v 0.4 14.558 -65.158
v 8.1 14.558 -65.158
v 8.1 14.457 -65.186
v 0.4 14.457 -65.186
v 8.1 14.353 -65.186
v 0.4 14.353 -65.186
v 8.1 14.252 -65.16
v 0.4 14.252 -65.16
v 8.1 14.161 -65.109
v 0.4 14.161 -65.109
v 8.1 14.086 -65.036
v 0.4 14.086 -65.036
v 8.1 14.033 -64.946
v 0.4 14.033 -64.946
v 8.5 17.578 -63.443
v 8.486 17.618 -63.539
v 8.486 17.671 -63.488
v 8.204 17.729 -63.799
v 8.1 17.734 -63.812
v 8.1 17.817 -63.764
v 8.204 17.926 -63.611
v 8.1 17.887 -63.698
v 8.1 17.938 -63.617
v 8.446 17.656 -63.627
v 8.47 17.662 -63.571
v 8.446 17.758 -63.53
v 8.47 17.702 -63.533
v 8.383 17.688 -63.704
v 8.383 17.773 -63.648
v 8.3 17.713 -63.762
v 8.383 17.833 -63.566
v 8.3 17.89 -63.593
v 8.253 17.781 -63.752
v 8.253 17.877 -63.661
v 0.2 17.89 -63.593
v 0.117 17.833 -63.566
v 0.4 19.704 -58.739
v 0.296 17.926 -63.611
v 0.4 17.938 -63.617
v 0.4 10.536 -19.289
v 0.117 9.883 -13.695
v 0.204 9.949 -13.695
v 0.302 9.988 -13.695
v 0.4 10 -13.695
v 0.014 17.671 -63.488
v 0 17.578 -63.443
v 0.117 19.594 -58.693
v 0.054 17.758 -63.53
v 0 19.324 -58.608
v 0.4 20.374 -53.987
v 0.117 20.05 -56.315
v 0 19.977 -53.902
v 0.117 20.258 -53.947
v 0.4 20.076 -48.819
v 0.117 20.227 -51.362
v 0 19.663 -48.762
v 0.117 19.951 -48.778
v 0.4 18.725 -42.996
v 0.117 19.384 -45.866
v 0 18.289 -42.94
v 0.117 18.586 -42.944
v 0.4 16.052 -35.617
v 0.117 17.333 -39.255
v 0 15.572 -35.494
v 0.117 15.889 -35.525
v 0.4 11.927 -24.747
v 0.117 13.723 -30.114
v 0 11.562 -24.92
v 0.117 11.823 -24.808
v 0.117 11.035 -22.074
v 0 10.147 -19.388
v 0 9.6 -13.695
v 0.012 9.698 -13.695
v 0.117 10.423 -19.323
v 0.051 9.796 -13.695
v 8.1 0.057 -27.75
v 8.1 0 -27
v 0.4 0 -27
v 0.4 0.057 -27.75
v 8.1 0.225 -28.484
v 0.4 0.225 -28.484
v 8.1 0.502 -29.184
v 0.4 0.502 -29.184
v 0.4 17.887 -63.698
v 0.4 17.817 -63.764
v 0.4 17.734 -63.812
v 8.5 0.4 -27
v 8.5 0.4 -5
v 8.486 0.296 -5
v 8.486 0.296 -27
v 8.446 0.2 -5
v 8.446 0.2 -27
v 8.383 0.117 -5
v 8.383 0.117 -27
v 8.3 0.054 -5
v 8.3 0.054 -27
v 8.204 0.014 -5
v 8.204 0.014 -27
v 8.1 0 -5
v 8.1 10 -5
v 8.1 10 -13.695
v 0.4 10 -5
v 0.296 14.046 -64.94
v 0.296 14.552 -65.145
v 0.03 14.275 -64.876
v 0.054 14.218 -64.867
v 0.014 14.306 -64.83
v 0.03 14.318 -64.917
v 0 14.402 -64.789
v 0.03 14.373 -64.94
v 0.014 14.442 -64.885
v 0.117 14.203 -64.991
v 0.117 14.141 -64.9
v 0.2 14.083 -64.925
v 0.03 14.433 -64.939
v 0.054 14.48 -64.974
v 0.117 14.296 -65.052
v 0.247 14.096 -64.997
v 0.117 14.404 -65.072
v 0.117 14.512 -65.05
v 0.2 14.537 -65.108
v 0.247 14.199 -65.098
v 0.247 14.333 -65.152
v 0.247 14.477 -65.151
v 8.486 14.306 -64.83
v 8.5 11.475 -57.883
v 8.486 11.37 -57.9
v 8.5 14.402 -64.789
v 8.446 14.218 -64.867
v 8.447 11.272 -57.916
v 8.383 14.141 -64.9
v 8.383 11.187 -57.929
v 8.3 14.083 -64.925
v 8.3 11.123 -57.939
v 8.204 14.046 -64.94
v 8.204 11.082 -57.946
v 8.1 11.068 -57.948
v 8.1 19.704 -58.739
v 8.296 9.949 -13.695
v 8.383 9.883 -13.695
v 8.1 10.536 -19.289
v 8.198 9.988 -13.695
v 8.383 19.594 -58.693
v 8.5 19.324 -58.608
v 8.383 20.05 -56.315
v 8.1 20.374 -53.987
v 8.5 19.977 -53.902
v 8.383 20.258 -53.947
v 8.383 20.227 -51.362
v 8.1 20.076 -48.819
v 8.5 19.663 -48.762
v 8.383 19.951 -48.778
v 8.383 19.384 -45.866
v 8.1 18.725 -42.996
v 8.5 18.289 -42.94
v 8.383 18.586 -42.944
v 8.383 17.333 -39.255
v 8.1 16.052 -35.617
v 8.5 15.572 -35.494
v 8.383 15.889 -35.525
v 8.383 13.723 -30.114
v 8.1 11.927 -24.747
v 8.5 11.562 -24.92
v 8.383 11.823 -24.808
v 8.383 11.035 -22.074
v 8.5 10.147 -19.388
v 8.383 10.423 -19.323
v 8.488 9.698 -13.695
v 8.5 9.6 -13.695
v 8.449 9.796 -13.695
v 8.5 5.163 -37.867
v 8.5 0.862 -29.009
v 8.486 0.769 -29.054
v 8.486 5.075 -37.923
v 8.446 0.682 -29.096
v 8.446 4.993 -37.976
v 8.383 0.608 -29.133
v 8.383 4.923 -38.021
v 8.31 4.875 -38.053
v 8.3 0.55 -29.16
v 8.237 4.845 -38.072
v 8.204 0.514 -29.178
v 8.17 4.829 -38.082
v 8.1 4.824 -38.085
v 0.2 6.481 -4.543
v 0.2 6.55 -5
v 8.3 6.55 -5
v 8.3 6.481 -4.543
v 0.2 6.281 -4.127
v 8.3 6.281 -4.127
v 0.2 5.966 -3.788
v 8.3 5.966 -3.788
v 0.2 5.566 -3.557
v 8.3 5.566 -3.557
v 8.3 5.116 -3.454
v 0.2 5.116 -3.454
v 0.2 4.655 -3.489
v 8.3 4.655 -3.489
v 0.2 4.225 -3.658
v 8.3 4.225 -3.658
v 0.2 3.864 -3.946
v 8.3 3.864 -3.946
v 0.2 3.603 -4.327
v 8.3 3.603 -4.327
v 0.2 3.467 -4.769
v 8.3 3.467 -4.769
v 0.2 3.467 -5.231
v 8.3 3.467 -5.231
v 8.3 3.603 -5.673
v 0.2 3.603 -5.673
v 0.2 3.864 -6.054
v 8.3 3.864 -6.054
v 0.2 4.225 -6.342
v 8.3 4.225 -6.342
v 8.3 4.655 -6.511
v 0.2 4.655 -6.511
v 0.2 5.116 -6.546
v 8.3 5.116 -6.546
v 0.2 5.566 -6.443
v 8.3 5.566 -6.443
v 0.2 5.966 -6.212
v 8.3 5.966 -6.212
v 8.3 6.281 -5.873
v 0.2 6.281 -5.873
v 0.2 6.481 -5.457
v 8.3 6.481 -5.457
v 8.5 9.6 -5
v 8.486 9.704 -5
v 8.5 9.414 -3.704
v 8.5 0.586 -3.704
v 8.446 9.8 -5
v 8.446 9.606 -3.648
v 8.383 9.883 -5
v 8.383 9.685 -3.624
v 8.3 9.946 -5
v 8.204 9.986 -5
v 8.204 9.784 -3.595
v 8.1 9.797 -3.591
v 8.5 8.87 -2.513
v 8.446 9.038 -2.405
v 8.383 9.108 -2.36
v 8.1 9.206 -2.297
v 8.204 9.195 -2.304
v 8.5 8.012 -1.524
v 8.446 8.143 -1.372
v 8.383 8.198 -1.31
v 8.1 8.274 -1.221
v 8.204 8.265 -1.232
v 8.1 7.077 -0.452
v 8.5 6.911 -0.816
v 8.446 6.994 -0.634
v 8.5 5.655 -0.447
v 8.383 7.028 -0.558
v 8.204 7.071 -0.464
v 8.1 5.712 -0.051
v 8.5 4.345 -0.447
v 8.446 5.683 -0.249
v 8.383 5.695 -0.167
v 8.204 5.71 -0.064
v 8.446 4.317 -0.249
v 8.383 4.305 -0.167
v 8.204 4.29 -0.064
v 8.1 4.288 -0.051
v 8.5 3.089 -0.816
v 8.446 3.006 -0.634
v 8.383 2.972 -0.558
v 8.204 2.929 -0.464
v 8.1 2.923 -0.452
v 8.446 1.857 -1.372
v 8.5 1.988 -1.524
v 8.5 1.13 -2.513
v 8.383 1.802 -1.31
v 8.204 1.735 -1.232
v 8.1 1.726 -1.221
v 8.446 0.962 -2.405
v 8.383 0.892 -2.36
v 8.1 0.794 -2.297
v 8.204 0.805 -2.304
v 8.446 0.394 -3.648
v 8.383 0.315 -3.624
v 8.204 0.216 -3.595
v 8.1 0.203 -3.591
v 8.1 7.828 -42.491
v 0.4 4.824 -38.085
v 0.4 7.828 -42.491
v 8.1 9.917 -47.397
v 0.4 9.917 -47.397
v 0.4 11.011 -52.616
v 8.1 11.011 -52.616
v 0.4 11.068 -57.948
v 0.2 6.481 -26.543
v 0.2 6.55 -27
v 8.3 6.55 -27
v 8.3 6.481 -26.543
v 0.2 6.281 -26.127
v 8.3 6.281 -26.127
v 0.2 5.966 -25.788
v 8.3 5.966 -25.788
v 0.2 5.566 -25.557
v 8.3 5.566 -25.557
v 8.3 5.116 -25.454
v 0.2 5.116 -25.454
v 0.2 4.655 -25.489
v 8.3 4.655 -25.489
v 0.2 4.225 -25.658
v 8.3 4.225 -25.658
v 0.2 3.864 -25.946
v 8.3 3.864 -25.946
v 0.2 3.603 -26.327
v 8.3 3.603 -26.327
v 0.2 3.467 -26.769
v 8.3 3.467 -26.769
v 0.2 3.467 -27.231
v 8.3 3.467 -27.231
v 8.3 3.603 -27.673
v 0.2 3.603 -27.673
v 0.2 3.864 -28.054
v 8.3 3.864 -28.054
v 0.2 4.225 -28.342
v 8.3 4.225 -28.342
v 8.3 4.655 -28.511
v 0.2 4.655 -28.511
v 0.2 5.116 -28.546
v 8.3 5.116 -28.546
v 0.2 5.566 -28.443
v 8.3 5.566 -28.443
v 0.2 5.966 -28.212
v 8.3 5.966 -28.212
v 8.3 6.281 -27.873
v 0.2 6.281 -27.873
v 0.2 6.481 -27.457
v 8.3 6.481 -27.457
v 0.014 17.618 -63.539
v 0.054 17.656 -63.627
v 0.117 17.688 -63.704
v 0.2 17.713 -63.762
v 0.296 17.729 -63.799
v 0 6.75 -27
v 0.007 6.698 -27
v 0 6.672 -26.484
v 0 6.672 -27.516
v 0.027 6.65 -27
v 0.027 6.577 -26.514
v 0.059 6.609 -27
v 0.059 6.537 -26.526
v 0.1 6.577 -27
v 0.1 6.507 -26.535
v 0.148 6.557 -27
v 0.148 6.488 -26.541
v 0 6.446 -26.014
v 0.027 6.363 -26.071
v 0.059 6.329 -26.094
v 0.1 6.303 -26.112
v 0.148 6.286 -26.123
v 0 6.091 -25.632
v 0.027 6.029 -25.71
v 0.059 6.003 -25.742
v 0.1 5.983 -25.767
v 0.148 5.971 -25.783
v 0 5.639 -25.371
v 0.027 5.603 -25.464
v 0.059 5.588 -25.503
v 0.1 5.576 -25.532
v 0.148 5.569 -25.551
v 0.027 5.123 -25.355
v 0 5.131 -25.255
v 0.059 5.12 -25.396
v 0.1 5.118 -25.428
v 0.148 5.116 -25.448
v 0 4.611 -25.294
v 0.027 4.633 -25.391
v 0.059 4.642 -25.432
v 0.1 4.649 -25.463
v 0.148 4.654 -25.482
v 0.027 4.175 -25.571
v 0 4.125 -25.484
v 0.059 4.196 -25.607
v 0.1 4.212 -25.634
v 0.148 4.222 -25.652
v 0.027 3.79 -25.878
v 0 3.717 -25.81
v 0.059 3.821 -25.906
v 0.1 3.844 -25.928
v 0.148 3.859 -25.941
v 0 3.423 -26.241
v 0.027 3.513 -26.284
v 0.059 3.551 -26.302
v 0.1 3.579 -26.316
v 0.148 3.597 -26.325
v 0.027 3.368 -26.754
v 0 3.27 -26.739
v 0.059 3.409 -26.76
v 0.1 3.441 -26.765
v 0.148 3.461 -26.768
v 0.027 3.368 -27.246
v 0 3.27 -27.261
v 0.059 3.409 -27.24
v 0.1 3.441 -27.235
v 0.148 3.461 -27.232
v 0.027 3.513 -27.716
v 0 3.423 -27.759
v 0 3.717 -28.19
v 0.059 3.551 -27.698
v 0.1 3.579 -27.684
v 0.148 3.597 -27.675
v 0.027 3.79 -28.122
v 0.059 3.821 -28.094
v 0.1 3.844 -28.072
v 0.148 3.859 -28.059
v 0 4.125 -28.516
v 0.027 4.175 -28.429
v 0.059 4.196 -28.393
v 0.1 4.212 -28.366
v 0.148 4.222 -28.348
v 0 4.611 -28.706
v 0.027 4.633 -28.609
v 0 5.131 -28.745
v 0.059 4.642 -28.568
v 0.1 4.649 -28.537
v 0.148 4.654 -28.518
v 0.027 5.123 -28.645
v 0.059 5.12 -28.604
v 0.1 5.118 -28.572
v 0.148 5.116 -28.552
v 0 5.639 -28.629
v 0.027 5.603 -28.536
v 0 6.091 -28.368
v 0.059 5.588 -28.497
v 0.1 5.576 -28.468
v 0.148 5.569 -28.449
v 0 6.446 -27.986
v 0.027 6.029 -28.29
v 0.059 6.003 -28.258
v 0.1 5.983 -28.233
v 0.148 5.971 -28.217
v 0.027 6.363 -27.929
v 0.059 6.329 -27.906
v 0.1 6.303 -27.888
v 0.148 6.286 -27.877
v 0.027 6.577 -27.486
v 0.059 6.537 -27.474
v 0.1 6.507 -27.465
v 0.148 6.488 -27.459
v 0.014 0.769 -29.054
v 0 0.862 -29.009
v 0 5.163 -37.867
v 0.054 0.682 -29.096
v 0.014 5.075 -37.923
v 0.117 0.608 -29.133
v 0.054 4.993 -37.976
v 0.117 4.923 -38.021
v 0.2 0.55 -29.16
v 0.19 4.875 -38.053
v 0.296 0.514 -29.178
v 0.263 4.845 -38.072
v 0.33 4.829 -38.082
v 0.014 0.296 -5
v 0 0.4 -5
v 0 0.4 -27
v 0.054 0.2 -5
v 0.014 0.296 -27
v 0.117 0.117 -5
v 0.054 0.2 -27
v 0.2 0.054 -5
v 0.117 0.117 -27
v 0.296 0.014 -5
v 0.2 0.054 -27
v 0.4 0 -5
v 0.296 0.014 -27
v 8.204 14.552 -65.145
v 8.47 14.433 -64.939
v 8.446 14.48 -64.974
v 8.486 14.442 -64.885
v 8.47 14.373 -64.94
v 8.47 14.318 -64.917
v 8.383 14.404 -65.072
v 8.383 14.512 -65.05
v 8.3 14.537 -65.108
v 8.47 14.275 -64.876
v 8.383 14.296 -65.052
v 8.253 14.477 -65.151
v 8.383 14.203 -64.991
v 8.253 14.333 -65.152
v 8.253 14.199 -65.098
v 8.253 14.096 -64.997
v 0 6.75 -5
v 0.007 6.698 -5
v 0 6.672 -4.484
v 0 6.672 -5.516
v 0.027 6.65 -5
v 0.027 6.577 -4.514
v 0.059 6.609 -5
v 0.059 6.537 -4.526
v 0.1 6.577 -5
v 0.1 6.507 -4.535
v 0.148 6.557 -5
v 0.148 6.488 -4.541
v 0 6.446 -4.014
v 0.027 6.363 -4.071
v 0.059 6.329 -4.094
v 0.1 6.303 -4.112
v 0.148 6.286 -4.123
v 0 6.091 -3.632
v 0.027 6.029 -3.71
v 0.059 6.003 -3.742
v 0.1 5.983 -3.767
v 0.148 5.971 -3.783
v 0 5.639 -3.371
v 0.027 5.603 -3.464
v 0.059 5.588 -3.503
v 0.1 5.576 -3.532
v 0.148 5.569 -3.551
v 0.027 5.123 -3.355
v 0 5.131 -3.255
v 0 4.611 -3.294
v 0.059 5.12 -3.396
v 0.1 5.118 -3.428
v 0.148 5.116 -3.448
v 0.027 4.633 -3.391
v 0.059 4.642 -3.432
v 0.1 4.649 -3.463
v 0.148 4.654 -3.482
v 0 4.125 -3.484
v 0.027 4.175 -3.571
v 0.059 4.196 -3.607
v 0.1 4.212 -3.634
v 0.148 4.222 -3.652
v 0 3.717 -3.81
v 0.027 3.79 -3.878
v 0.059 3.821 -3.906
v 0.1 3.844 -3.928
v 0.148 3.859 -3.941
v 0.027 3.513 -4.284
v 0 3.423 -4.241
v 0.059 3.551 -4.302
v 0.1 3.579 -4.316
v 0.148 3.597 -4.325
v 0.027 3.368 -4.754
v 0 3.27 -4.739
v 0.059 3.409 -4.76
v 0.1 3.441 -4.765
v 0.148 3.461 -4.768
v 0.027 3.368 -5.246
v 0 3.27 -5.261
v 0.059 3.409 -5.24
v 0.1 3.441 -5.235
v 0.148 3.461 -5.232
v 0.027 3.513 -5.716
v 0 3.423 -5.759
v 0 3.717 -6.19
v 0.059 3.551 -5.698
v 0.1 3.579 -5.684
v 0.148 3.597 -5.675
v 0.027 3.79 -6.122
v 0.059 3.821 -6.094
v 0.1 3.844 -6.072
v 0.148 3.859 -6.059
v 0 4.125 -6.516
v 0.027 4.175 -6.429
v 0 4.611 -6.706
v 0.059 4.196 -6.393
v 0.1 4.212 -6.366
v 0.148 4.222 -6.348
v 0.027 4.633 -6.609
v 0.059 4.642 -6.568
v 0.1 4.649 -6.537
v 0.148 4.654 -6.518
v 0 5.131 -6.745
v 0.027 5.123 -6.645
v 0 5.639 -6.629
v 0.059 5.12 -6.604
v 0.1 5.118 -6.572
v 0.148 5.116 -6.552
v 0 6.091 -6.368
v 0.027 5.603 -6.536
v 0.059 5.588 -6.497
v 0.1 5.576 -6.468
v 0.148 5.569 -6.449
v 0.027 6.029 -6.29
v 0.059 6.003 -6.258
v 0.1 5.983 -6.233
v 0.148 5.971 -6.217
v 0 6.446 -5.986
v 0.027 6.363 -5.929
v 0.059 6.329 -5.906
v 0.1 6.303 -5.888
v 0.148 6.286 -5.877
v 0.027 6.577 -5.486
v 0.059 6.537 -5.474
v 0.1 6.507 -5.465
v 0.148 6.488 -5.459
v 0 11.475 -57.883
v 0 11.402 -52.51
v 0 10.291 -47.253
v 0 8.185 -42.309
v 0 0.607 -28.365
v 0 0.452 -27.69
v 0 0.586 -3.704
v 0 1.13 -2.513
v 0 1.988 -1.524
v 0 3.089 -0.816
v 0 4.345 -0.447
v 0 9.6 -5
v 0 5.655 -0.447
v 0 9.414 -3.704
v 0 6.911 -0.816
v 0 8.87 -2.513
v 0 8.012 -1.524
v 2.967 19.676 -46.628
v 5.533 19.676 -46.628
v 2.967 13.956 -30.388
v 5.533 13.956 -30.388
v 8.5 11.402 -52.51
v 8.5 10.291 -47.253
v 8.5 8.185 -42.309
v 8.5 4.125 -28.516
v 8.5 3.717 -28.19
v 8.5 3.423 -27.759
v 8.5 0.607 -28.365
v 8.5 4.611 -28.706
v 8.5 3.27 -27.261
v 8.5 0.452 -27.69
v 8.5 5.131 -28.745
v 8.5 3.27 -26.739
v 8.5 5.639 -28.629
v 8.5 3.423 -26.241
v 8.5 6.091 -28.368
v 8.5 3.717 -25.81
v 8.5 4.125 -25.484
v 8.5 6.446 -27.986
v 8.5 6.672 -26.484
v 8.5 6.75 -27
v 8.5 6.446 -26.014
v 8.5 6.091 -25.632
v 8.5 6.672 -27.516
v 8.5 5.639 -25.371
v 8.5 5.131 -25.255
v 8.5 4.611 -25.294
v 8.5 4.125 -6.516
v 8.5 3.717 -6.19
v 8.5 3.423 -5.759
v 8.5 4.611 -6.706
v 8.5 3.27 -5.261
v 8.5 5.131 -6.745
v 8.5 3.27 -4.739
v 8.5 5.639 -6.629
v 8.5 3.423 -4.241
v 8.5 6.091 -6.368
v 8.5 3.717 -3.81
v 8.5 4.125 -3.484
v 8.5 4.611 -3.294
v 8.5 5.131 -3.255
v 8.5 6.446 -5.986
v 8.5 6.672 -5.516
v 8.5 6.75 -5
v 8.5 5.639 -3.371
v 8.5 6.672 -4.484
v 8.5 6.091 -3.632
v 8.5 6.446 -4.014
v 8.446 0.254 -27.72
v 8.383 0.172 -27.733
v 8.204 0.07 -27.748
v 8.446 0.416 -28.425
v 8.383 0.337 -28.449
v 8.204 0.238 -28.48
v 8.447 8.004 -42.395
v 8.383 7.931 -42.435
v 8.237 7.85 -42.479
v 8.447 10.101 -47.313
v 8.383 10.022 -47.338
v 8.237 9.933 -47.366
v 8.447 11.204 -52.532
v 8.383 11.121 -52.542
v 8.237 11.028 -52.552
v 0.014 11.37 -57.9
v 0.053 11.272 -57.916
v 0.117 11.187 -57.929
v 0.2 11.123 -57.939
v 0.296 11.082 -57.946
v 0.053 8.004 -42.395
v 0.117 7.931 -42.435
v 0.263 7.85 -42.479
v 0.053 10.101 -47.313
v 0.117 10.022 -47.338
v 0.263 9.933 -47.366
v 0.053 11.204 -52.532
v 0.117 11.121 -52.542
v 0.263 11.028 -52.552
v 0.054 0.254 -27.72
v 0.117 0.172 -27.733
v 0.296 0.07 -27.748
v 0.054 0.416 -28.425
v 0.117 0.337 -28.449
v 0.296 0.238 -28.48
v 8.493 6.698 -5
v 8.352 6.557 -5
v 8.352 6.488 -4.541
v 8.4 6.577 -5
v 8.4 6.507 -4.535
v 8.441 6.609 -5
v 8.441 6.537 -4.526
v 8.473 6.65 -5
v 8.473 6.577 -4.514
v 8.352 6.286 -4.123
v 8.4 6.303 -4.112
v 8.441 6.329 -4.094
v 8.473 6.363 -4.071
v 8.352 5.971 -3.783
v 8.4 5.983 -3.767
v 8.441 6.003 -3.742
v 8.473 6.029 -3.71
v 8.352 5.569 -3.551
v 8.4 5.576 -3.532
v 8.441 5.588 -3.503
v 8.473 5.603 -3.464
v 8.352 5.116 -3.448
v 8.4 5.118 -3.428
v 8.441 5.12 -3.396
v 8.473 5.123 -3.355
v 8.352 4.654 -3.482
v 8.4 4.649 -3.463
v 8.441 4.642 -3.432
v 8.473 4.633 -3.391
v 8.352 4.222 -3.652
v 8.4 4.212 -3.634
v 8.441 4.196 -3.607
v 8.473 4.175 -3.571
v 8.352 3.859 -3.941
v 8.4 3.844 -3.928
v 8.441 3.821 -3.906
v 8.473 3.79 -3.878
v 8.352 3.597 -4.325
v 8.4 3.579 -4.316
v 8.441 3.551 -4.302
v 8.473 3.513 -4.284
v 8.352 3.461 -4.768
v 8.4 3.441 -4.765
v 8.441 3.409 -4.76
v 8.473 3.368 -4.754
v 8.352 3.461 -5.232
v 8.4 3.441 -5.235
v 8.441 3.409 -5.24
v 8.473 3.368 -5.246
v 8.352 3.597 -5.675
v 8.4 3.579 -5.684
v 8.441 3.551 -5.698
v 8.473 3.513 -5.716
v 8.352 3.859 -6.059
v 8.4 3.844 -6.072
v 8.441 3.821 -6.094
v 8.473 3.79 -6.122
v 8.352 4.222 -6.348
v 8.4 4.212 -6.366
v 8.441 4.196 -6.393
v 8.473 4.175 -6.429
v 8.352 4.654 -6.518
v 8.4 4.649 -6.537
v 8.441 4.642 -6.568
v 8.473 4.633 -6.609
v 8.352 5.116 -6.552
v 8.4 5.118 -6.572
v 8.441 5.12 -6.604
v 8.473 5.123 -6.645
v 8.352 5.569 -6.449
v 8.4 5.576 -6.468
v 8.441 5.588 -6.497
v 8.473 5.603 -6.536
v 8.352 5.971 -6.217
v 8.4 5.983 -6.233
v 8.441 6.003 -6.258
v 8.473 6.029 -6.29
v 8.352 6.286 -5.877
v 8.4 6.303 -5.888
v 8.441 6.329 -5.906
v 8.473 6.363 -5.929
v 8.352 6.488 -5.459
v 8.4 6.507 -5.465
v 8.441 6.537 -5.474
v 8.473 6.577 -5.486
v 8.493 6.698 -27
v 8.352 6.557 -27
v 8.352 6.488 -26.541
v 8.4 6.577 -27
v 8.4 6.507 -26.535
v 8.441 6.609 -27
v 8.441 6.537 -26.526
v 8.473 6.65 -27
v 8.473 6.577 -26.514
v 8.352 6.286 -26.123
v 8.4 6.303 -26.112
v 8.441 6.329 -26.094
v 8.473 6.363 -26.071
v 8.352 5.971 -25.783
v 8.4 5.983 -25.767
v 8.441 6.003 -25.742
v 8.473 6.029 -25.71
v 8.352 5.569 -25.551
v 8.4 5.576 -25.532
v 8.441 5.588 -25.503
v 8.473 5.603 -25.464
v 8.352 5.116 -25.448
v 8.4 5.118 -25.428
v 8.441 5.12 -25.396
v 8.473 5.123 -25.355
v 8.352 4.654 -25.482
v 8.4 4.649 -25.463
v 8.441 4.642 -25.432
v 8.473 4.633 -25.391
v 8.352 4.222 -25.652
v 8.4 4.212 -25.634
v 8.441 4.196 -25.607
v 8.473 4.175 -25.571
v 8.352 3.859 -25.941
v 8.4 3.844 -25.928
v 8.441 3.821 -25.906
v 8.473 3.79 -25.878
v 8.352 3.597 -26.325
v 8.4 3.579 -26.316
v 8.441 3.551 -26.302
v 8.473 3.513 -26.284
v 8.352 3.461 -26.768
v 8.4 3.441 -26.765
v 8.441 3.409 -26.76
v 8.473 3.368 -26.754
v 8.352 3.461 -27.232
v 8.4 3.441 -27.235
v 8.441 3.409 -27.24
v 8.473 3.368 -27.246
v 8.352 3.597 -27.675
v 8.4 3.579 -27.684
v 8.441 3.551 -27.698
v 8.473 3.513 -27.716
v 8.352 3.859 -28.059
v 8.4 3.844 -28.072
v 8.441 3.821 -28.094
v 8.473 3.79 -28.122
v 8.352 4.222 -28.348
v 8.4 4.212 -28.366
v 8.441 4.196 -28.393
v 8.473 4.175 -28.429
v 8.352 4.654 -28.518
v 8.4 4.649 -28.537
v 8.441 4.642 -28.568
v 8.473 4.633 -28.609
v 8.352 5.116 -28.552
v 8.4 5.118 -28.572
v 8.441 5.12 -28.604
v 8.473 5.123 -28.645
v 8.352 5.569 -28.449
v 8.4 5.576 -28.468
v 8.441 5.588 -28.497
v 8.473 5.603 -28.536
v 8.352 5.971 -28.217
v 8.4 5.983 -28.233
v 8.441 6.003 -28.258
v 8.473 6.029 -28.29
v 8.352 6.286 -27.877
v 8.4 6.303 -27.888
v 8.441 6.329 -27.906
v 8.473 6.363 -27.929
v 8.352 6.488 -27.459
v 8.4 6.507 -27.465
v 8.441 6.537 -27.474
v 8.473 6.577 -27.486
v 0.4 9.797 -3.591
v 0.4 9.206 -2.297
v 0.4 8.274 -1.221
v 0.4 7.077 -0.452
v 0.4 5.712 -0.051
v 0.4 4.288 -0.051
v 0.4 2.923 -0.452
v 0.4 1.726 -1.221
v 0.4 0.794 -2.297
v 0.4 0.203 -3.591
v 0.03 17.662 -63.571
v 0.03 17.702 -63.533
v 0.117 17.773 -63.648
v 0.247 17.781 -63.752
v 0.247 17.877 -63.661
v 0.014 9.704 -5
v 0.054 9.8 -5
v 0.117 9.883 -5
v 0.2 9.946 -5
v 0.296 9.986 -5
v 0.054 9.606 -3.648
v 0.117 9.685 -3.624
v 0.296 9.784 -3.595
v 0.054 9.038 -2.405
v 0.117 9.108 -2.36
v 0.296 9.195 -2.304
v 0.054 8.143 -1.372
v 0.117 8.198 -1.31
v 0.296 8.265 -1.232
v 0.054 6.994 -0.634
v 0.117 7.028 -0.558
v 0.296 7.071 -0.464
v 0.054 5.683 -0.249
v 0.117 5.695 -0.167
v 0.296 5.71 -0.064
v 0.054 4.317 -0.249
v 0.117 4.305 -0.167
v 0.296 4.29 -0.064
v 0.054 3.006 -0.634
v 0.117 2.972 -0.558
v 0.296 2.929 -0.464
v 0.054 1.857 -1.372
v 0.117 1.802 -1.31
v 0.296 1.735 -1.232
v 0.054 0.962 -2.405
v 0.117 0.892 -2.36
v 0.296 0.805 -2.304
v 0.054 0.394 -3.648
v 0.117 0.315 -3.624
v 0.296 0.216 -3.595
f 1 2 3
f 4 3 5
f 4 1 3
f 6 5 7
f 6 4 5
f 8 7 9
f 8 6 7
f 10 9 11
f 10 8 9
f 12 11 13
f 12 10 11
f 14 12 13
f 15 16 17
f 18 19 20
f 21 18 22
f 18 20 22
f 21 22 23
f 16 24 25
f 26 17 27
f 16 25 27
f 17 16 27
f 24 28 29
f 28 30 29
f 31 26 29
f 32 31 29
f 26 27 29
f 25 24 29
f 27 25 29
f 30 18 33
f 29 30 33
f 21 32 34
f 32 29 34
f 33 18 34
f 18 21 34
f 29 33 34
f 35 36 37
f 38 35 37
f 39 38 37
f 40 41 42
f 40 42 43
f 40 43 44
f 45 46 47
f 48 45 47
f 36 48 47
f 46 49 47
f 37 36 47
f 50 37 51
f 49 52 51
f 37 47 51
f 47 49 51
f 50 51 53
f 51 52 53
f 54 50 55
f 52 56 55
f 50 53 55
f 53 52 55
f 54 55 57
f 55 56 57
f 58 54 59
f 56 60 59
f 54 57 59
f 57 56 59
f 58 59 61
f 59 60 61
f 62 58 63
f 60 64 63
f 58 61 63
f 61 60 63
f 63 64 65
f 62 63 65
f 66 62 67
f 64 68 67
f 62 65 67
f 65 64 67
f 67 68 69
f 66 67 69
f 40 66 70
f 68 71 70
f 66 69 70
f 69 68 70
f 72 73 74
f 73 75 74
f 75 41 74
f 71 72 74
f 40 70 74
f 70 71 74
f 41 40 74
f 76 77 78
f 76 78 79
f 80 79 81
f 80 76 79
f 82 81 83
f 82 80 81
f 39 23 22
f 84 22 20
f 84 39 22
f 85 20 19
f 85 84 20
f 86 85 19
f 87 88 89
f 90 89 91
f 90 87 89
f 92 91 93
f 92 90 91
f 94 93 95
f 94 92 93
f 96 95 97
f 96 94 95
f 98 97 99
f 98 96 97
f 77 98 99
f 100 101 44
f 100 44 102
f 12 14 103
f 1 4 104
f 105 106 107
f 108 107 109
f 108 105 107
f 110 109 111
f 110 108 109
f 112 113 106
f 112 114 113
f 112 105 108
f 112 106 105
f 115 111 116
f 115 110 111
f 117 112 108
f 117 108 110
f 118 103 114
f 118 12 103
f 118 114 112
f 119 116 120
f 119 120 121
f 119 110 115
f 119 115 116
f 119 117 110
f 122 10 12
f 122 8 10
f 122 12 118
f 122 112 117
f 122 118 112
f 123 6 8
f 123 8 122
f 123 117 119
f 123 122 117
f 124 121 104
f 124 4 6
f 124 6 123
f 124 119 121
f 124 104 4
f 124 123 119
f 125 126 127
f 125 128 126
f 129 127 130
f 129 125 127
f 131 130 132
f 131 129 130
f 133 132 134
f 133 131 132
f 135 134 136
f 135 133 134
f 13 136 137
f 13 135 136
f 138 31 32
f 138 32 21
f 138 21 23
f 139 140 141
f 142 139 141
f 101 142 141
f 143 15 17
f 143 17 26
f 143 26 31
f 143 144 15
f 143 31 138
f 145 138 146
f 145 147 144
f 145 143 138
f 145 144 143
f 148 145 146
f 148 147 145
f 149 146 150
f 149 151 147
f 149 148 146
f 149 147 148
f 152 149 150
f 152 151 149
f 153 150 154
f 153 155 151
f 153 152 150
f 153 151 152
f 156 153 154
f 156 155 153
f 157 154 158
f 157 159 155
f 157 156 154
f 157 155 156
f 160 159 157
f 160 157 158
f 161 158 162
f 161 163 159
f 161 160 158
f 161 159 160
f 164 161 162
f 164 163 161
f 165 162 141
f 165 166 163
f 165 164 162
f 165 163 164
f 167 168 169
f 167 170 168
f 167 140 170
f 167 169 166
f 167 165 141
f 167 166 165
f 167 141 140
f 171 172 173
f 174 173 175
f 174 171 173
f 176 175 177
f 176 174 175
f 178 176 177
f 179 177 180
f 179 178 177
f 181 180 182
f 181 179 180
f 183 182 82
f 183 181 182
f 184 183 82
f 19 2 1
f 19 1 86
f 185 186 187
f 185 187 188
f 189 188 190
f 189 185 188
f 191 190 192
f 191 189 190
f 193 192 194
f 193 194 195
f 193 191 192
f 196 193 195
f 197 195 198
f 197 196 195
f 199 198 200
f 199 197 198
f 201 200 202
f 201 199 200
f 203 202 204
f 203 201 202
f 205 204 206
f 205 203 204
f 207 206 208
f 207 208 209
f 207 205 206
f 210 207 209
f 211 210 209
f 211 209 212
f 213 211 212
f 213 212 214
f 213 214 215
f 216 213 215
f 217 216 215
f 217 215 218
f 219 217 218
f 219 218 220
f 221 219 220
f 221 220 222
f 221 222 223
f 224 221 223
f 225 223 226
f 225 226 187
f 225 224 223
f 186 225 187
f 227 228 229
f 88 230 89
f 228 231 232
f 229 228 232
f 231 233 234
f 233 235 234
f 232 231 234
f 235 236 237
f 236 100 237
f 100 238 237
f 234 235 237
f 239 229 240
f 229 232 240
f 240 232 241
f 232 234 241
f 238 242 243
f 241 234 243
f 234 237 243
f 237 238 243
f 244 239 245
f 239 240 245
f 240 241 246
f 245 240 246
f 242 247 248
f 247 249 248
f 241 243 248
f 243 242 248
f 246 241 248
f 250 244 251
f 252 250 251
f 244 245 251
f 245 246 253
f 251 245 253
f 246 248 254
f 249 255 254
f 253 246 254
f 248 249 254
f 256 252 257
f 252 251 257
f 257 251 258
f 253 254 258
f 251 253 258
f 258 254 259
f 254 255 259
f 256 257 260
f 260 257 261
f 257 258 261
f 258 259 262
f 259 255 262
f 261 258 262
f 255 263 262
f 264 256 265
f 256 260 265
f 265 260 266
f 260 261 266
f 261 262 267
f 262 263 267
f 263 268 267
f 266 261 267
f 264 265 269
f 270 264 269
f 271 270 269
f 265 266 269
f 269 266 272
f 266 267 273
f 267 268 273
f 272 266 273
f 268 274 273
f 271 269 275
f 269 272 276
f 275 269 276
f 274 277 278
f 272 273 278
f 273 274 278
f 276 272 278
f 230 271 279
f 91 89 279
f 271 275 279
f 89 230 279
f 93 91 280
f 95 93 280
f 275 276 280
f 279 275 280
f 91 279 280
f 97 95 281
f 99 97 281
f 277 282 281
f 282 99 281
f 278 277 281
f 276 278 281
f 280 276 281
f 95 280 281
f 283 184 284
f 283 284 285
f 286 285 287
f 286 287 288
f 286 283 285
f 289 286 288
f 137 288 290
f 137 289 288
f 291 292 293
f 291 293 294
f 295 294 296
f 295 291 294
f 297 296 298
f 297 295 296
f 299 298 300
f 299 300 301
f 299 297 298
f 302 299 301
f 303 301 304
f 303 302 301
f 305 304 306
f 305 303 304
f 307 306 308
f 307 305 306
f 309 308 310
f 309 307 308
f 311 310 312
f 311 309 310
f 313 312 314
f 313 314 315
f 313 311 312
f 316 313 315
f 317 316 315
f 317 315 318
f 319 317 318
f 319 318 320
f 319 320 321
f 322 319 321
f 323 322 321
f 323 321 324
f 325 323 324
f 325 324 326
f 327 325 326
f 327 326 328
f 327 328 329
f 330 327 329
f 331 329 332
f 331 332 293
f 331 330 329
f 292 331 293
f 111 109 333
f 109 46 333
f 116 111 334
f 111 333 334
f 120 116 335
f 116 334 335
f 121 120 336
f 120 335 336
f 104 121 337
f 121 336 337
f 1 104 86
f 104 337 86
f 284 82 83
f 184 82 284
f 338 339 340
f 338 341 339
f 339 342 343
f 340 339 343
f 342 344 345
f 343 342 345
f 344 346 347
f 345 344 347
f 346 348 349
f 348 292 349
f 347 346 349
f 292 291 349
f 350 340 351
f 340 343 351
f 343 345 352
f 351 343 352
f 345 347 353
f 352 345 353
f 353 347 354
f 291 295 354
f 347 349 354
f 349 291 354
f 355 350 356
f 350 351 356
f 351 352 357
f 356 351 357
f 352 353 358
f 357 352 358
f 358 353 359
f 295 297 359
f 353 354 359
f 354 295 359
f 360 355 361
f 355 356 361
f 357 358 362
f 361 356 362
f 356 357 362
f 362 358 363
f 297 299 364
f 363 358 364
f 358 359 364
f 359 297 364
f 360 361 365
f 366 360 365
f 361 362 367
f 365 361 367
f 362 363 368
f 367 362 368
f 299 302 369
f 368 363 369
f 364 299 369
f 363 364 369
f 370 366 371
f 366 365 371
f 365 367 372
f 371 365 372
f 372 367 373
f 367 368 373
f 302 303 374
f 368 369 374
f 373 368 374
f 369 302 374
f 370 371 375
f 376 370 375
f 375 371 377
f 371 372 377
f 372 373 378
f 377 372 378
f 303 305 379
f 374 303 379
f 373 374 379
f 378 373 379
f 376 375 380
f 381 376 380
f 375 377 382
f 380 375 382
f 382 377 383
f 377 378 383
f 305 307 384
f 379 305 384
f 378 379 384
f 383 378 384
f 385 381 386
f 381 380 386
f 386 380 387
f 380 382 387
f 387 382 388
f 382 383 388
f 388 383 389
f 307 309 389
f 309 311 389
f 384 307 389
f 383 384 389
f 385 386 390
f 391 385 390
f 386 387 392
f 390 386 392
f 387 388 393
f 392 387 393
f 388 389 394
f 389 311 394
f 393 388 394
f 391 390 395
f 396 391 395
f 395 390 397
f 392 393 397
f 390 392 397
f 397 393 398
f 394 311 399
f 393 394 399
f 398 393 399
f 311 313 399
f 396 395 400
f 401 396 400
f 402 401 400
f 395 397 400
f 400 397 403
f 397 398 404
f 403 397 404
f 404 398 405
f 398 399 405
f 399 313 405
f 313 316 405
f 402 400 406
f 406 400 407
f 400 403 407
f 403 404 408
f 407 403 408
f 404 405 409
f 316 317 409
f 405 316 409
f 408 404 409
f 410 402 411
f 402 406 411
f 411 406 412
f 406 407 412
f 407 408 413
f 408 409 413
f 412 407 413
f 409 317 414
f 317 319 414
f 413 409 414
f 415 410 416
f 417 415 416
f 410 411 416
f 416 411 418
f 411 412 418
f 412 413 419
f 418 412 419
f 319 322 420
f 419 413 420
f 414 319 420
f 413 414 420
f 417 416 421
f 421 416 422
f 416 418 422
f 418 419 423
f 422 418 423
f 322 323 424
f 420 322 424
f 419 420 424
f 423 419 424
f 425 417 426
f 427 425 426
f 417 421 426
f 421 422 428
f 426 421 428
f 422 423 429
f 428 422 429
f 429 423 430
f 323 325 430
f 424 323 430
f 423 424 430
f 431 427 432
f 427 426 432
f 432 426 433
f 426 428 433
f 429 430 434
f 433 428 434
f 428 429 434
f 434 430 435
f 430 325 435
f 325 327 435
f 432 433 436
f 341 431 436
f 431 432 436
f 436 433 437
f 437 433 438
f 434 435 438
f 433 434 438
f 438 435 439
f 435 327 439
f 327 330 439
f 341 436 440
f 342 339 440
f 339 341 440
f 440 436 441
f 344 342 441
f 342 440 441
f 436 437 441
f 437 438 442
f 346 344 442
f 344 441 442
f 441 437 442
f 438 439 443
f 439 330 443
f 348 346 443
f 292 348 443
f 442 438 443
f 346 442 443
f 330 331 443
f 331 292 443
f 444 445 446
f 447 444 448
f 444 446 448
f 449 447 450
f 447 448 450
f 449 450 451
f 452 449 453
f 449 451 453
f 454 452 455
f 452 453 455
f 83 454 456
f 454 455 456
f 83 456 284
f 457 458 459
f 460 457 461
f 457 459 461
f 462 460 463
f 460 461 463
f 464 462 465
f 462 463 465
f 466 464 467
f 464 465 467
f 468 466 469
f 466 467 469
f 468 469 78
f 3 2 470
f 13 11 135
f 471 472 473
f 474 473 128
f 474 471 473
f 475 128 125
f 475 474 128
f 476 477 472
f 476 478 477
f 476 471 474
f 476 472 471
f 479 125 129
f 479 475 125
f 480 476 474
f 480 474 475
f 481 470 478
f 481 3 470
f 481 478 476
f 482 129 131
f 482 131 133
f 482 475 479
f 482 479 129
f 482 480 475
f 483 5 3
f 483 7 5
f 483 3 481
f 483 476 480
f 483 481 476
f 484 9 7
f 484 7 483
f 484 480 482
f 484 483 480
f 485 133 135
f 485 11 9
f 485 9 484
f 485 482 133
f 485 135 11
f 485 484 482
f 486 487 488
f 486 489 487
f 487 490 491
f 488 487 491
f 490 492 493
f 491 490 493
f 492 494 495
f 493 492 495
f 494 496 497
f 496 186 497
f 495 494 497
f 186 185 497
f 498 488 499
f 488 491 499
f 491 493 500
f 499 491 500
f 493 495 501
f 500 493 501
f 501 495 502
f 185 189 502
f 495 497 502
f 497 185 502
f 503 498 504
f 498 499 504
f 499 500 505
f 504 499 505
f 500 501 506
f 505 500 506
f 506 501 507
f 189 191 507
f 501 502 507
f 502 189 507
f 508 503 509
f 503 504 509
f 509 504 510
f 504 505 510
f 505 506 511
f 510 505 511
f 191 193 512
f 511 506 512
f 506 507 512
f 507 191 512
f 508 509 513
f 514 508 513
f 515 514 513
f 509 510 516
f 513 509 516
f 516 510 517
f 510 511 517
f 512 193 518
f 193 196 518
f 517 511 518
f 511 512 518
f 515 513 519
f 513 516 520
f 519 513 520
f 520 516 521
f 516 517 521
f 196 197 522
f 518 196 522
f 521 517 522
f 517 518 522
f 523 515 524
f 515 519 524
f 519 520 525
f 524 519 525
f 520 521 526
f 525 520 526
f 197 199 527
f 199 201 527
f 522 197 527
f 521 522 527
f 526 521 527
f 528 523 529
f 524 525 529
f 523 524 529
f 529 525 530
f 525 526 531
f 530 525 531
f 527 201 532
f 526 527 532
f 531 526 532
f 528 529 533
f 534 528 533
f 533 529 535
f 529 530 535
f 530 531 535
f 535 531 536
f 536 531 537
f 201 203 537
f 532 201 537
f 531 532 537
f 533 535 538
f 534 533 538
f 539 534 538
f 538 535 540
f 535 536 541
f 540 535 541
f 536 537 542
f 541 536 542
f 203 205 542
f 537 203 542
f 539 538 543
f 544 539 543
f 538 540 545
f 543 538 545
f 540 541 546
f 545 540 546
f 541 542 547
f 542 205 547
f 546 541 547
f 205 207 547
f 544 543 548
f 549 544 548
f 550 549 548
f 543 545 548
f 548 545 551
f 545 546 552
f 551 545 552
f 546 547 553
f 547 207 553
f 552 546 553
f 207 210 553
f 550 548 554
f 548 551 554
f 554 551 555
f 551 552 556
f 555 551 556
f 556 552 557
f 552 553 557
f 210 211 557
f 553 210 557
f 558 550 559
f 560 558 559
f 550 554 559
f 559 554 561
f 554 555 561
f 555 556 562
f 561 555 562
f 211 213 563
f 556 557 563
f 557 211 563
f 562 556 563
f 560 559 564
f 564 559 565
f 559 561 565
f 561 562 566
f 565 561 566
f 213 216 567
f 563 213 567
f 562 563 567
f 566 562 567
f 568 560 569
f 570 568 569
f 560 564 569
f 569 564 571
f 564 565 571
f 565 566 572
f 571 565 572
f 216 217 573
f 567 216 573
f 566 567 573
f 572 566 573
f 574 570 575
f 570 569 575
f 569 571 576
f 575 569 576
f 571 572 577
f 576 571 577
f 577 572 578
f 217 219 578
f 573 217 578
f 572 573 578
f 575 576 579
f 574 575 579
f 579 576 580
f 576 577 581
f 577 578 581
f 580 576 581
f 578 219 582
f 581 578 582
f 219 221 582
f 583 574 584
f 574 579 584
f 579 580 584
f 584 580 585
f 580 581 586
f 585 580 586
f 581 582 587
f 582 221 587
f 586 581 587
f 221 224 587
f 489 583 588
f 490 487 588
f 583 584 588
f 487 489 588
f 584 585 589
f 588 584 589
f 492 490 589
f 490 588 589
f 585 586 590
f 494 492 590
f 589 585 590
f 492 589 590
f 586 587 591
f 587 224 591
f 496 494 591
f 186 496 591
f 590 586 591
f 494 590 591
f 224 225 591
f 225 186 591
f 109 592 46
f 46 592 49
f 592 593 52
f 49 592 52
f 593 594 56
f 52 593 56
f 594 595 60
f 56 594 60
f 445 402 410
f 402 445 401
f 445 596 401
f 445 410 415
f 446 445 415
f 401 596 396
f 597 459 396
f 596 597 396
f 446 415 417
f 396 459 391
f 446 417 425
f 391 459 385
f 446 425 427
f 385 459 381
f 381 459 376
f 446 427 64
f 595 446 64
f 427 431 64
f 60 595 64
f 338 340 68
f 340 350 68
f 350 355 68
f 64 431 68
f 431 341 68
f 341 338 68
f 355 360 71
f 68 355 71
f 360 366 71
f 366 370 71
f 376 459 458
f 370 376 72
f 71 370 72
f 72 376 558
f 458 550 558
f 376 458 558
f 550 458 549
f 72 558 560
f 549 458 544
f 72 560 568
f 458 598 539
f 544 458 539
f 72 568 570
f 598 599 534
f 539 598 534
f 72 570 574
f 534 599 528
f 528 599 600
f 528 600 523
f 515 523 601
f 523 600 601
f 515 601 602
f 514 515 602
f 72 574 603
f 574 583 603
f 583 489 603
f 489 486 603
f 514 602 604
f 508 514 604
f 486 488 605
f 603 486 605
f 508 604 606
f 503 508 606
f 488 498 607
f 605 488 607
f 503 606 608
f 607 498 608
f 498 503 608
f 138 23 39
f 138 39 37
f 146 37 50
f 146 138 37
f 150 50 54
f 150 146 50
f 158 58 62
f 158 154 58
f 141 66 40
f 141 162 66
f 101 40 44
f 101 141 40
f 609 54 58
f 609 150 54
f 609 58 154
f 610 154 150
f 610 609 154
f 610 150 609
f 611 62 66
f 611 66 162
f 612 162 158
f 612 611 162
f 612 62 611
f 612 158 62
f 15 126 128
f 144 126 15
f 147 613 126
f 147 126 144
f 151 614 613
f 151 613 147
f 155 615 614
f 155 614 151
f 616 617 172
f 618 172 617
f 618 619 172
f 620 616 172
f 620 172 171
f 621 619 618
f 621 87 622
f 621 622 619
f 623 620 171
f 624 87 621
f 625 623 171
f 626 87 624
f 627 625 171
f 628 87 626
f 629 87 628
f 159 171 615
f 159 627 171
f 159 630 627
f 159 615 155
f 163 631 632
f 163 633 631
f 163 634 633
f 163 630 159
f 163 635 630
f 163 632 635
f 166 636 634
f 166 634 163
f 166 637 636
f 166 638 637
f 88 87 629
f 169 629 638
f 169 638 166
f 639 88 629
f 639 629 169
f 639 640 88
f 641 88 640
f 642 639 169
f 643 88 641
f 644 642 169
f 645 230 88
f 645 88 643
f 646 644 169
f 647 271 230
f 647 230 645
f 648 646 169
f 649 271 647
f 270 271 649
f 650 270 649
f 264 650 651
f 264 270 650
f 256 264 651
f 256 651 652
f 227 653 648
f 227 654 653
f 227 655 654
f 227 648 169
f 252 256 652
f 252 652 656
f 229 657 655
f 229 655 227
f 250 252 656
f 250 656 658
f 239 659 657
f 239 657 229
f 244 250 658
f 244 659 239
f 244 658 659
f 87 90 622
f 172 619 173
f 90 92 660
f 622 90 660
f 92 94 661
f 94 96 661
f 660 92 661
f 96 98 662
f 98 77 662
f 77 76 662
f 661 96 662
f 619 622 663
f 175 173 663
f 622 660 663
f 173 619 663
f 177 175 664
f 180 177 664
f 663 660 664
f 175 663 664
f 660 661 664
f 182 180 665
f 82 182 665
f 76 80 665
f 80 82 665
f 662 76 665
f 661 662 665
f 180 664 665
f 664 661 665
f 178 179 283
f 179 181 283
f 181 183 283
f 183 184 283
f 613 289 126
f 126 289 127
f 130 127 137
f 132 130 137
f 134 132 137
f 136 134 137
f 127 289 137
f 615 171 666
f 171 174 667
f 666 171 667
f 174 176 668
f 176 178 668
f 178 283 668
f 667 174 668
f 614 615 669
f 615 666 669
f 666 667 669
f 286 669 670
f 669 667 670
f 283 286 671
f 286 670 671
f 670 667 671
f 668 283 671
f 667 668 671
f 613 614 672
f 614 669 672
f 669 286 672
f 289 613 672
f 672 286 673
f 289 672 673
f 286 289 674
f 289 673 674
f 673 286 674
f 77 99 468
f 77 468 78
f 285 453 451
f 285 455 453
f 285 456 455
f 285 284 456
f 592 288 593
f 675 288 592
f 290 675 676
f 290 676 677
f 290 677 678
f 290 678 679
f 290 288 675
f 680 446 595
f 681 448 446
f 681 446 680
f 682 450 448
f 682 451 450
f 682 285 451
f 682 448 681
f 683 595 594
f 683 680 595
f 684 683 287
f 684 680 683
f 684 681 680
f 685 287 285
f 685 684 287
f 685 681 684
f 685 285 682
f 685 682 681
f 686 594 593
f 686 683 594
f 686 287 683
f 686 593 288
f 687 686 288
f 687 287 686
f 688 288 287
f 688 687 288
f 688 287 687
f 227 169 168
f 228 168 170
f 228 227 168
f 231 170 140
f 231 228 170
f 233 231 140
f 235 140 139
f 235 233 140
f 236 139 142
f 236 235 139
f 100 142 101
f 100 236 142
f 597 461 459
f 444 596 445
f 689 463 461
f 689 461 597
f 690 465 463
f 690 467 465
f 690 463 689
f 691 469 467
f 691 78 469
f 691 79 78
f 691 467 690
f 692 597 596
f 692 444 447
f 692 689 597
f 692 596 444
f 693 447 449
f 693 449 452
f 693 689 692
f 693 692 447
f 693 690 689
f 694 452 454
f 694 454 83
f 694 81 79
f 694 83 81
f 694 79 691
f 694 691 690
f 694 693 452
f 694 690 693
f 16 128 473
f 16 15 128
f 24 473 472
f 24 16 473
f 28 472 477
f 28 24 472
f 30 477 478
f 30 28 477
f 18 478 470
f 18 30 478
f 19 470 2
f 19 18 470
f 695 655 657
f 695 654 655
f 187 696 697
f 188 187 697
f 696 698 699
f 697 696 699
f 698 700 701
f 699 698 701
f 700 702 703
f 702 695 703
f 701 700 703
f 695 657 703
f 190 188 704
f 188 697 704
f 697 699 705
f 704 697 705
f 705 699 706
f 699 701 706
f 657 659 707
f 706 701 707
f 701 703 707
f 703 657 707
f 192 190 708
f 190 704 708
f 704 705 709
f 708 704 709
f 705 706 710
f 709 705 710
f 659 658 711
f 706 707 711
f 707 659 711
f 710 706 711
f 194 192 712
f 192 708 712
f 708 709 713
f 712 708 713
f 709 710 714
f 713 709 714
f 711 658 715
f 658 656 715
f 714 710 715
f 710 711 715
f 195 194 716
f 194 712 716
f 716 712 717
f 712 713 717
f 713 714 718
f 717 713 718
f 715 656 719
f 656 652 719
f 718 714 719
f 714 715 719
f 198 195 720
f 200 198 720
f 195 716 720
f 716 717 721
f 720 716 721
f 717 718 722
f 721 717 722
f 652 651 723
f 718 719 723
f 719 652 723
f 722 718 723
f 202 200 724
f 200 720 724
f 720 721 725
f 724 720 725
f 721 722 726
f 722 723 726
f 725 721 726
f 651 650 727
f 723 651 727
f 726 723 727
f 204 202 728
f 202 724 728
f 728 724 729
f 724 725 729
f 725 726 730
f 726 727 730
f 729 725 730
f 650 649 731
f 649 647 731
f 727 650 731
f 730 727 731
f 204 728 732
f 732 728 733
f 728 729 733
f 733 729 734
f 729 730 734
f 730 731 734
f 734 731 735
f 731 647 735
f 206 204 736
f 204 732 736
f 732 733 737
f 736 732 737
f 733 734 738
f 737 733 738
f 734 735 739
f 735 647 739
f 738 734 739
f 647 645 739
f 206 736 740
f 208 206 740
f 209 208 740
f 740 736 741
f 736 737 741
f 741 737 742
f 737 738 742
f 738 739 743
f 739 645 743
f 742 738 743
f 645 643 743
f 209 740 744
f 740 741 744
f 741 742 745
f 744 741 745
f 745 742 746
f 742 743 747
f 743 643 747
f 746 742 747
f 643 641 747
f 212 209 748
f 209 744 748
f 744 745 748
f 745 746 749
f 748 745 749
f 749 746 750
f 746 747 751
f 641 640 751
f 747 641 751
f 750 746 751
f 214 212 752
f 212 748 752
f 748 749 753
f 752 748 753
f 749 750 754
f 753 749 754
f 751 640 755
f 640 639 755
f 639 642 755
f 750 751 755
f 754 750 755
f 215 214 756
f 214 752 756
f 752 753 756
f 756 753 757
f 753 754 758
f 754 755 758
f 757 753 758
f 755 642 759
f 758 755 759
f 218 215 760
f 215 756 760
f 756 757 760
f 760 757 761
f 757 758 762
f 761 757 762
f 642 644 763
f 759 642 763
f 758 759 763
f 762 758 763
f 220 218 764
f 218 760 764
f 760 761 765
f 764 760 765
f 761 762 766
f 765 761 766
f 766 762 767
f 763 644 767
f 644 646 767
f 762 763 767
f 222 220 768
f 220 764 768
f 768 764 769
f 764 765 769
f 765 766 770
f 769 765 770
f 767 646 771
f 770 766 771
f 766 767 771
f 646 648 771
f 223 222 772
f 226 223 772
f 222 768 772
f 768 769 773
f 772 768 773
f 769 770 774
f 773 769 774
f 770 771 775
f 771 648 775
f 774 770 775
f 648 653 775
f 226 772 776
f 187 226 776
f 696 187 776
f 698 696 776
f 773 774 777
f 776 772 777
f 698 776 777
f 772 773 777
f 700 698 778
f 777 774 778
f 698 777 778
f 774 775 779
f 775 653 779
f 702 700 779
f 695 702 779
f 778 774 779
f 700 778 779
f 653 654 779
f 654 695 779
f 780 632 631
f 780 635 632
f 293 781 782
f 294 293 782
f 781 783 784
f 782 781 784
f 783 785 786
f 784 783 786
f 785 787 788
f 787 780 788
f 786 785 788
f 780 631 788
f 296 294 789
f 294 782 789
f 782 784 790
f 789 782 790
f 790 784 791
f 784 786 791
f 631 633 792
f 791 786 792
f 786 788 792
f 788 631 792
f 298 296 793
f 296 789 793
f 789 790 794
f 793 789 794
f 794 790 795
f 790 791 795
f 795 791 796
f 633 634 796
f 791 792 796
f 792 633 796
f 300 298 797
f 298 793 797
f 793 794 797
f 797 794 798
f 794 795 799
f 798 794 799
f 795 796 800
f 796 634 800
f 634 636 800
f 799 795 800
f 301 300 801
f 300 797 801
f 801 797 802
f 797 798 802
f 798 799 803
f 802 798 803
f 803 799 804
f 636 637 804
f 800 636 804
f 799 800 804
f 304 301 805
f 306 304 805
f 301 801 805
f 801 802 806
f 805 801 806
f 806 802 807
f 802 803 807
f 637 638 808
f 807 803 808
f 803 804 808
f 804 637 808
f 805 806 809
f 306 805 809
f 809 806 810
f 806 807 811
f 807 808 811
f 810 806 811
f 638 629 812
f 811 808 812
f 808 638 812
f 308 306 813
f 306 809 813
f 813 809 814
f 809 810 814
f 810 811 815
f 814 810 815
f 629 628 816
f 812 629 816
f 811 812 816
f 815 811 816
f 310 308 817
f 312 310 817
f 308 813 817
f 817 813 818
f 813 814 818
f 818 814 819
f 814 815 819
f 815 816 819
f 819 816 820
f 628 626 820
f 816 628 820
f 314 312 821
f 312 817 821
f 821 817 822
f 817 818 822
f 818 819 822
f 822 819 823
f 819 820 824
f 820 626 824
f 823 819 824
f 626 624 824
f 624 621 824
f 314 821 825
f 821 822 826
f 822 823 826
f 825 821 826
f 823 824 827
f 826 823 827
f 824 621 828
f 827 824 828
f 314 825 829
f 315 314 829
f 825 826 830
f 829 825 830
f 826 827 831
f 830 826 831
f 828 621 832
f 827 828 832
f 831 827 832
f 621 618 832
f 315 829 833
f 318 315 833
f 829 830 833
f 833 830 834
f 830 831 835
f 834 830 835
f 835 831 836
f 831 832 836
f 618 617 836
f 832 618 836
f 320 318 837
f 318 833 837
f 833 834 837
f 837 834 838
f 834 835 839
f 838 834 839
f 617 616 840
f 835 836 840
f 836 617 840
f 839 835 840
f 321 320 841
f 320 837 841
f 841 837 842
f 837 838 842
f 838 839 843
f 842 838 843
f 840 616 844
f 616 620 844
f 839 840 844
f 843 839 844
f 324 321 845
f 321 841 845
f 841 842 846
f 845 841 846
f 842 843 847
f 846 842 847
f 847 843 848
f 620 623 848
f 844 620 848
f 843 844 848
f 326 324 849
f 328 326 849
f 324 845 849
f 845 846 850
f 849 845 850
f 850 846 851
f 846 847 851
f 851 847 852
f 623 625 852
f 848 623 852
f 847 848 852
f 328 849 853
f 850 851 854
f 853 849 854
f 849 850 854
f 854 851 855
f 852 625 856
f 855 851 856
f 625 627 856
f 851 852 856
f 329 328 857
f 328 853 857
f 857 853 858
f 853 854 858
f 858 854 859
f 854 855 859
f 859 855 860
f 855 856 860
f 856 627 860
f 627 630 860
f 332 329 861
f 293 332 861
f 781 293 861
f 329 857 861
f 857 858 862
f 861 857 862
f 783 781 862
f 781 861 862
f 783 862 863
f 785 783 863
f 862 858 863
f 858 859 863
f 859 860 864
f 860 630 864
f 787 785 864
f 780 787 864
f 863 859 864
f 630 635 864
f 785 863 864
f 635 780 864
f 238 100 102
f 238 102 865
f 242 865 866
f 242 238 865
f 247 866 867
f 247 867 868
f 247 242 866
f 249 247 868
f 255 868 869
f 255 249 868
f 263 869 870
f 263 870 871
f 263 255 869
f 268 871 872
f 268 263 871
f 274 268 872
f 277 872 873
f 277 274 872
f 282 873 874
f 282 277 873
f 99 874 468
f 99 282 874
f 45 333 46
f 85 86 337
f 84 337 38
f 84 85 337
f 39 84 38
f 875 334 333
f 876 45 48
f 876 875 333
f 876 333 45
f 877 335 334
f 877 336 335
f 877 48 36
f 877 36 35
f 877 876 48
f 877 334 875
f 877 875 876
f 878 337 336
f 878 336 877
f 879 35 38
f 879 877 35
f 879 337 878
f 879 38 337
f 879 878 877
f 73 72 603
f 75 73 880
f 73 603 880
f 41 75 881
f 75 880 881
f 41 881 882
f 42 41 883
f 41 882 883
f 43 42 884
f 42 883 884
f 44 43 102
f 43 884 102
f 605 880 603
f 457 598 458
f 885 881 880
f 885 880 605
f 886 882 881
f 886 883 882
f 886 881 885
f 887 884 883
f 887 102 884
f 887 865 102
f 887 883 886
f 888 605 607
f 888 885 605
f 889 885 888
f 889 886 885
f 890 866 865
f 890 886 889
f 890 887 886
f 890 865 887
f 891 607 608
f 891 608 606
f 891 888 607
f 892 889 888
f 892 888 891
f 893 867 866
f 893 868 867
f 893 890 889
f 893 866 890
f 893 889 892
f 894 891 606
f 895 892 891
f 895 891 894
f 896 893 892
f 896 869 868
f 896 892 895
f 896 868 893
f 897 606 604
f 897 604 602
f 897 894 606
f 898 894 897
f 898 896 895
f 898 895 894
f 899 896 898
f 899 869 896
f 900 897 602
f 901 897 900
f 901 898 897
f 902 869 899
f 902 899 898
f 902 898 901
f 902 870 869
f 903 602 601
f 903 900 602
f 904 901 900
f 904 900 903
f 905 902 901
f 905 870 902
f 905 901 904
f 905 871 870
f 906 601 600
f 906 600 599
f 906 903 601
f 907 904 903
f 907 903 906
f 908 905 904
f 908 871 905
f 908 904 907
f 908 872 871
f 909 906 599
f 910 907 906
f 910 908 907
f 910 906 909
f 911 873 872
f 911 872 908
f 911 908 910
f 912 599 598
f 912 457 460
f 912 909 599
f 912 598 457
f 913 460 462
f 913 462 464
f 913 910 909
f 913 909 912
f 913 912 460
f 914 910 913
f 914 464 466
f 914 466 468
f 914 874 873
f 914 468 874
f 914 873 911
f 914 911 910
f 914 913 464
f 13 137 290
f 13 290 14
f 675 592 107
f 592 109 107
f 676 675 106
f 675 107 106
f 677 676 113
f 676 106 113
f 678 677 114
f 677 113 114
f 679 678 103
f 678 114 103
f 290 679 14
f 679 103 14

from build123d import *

# Parameters (mm, degrees)
SKETCH_1_R            = 1.75
EXTRUDE_1_DEPTH       = 8.5
EXTRUDE_2_OUTLINE_R   = 1.75
EXTRUDE_2_OUTLINE_R_2 = 1.55
EXTRUDE_2_DEPTH       = 8.5
FILLET_1_R            = 0.4
FILLET_2_R            = 0.2


# Read off the part's stored shape, not the designer's step: 凸台-拉伸2
with BuildPart() as part:
    # 草图1 → 凸台-拉伸1 (new body)
    with BuildSketch(Plane(origin=(8.5, 0, 0), x_dir=(0, 0, -1), z_dir=(1, 0, 0))):
        with BuildLine():
            Line((13.694974759, 10), (5, 10))
            ThreePointArc((5, 10), (0, 5), (5, 0))
            Line((5, 0), (27, 0))
            ThreePointArc((27, 0), (28.120410255, 0.12714859), (29.183837075, 0.502127655))
            Line((29.183837075, 0.502127655), (38.08542066, 4.824084077))
            ThreePointArc((38.08542066, 4.824084077), (47.396990541, 9.917410338), (57.948000409, 11.067843667))
            Line((57.948000409, 11.067843667), (65.313809691, 14.189518476))
            Line((65.313809691, 14.189518476), (63.752972286, 17.872423117))
            add(Edge.make_bspline(
                [(63.752972286, 17.872423117), (45.928882678, 26.563787963), (31.059268621, 10), (13.694974759, 10)],
                knots=[0, 0, 0, 0, 1, 1, 1, 1], degree=3))
        make_face()
        with Locations(Location((5, 5, 0), (0, 0, 180))):
            Circle(SKETCH_1_R, mode=Mode.SUBTRACT)
        with Locations(Location((27, 5, 0), (0, 0, 180))):
            Circle(SKETCH_1_R, mode=Mode.SUBTRACT)
    extrude(amount=-EXTRUDE_1_DEPTH)

    # 凸台-拉伸2 outline → 凸台-拉伸2 (add)
    # profile 1 of 2: a face of its own
    with BuildSketch(Plane.YZ):
        with Locations((5, -5)):
            Circle(EXTRUDE_2_OUTLINE_R)
        with Locations((5, -5)):
            Circle(EXTRUDE_2_OUTLINE_R_2, mode=Mode.SUBTRACT)
    # profile 2 of 2: a face of its own
    with BuildSketch(Plane.YZ):
        with Locations((5, -27)):
            Circle(EXTRUDE_2_OUTLINE_R)
        with Locations((5, -27)):
            Circle(EXTRUDE_2_OUTLINE_R_2, mode=Mode.SUBTRACT)
    extrude(amount=EXTRUDE_2_DEPTH)

    # 圆角1
    fillet_1_edges = [part.edges().sort_by_distance(p)[0] for p in [
        (8.5, 9.917410338, -47.396990541),
        (8.5, 2.663105866, -33.634628868),
        (8.5, 0.12714859, -28.120410255),
        (8.5, 0, -16),
        (8.5, 5, 0),
        (8.5, 10, -9.347487379),
        (8.5, 17.192155422, -38.542735392),
        (0, 5, 0),
        (4.25, 17.872423117, -63.752972286),
        (4.25, 14.189518476, -65.313809691),
        (0, 0, -16),
        (0, 0.12714859, -28.120410255),
        (0, 2.663105866, -33.634628868),
        (0, 9.917410338, -47.396990541),
        (0, 12.628681071, -61.63090505),
        (0, 16.030970797, -64.533390989),
        (0, 17.192155422, -38.542735392),
        (0, 10, -9.347487379),
        (8.5, 16.030970797, -64.533390989),
        (8.5, 12.628681071, -61.63090505),
    ]]
    fillet(fillet_1_edges, radius=FILLET_1_R)

    # 圆角2
    fillet_2_edges = [part.edges().sort_by_distance(p)[0] for p in [
        (0, 3.45, -27),
        (8.5, 3.45, -27),
        (0, 3.45, -5),
        (8.5, 3.45, -5),
    ]]
    fillet(fillet_2_edges, radius=FILLET_2_R)


solid = part.part
